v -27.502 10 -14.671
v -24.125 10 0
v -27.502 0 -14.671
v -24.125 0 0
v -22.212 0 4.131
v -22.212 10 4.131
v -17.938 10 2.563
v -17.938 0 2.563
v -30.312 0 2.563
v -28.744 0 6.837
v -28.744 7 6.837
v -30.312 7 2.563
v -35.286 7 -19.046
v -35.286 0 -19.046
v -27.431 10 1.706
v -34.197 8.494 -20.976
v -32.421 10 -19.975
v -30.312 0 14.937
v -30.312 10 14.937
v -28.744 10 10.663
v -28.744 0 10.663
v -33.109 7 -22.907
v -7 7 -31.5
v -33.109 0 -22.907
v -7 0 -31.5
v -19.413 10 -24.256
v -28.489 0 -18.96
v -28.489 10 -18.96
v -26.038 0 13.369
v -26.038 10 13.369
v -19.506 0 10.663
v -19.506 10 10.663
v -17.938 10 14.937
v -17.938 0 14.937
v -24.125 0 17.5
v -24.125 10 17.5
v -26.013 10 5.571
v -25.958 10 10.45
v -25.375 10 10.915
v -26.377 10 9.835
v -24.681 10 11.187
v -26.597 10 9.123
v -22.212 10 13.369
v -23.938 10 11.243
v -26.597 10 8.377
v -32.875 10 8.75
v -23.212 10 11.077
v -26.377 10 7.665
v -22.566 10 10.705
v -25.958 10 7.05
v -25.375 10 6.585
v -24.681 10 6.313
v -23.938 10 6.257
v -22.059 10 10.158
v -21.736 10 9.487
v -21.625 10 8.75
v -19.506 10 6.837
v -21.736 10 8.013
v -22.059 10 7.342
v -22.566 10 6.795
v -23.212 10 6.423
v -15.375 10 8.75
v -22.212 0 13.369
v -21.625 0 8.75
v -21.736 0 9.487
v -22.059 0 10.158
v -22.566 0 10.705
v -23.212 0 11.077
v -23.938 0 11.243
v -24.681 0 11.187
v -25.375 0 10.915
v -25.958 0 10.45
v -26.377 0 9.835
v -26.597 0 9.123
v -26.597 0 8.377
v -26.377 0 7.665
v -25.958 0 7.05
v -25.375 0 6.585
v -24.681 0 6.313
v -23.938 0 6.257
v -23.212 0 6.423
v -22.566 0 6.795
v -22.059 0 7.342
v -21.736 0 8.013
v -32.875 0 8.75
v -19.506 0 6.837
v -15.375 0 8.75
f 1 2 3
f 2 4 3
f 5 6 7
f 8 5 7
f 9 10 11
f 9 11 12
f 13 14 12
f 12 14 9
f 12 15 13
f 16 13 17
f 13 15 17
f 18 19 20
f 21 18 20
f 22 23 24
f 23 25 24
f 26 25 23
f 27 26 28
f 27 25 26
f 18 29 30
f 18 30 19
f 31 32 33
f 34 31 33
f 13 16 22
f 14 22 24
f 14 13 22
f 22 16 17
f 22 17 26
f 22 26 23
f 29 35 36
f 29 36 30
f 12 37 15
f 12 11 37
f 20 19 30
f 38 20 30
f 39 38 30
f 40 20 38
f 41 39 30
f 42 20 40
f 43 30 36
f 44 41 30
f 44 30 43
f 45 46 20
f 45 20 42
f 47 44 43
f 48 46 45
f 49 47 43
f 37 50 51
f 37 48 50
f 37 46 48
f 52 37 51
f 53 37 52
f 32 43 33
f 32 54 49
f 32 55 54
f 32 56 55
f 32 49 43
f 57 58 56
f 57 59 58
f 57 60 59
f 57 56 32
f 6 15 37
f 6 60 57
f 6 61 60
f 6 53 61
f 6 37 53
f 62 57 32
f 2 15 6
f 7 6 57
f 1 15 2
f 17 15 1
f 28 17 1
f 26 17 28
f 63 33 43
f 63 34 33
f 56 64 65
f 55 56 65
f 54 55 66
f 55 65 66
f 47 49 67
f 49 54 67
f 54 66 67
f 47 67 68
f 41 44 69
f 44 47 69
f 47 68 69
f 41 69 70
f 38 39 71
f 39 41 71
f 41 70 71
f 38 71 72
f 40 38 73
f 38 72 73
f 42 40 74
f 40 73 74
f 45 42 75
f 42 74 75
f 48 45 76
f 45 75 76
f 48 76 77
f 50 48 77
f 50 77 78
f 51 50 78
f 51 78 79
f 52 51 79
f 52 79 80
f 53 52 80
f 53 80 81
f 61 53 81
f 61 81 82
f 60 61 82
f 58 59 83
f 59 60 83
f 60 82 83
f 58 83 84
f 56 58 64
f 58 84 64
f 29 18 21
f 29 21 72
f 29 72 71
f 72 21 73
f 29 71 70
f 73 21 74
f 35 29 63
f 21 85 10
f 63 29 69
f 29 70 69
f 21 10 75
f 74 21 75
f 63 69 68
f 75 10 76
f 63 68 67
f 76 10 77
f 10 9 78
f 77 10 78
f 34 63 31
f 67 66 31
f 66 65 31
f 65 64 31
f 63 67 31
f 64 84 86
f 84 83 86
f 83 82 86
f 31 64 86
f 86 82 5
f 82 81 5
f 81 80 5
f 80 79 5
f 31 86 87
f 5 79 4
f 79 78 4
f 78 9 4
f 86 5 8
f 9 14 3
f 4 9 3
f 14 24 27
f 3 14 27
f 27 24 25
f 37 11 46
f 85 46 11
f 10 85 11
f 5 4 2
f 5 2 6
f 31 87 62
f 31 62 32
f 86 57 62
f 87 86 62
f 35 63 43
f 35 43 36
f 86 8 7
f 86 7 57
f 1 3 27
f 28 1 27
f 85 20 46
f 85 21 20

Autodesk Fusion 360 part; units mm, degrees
sketch "Sketch1" plane through (0, 0, 0) normal (0, 1, 0) x (1, 0, 0)
  line L0 (-7, 31.5) -> (-7, 0) construction
  line L1 (-35.9586, 21.9692) -> (-30.3122, -2.5628)
  line L2 (-7, 31.5) -> (-35.9586, 21.9692)
  line L3 (-22.2116, -4.1306) -> (-17.9378, -2.5628)
  line L4 (-27.5018, 14.6711) -> (-28.4889, 18.96)
  line L5 (-26.0384, -4.1306) -> (-24.125, 0)
  line L6 (-30.3122, -2.5628) -> (-24.125, 0)
  line L7 (-24.125, 0) -> (-17.9378, -2.5628)
  line L8 (-7, 31.5) -> (-14, -20.9929)
  line L9 (-7, 31.5) -> (-34.239, 31.5)
  circle A0 centre (-24.125, -8.75) radius 5
  line L10 (-24.125, 0) -> (-27.5018, 14.6711)
  circle A1 centre (-24.125, -8.75) radius 2.5
  line L11 (-30.3122, -14.9372) -> (-32.875, -8.75)
  line L12 (-28.7444, -10.6634) -> (-32.875, -8.75)
  line L13 (-17.9378, -2.5628) -> (-15.375, -8.75)
  line L14 (-24.125, -17.5) -> (-26.0384, -13.3694)
  line L15 (-43.7102, -20.9929) -> (-14, -20.9929)
  line L16 (-19.5056, -10.6634) -> (-17.9378, -14.9372)
  line L17 (-17.9378, -14.9372) -> (-24.125, -17.5)
  line L18 (-15.375, -8.75) -> (-17.9378, -14.9372)
  line L19 (-32.875, -8.75) -> (-28.7444, -6.8366)
  line L20 (-26.0384, -13.3694) -> (-30.3122, -14.9372)
  line L21 (-19.5056, -6.8366) -> (-15.375, -8.75)
  line L22 (-22.2116, -13.3694) -> (-24.125, -17.5)
  line L23 (-17.9378, -14.9372) -> (-22.2116, -13.3694)
  line L24 (-34.239, 31.5) -> (-43.7102, -20.9929)
  line L25 (-32.875, -8.75) -> (-30.3122, -2.5628)
  line L26 (-24.125, -17.5) -> (-30.3122, -14.9372)
  line L27 (-17.9378, -2.5628) -> (-19.5056, -6.8366)
  line L28 (-15.375, -8.75) -> (-19.5056, -10.6634)
  line L29 (-30.3122, -14.9372) -> (-28.7444, -10.6634)
  line L30 (-24.125, 0) -> (-22.2116, -4.1306)
  line L31 (-7, 31.5) -> (-28.4889, 18.96)
  line L32 (-29.1989, 4.3652) -> (-29.1875, 4.3554)
  line L33 (-30.3122, -2.5628) -> (-26.0384, -4.1306)
  line L34 (-21.0314, -1.2814) -> (-24.125, -8.75) construction
  line L35 (-28.7444, -6.8366) -> (-30.3122, -2.5628)
  point P0 (-24.125, -8.75)
  point P1 (-14, 0)
  point P2 (-14, 0)
  point P3 (-14, 0)
  point P4 (-7, 0)
extrude "Extrude1" add sketch "Sketch1" along normal blind 10 contours L1 L2 L4 L6 L10 L31 | L5 L6 L33 | A0 L33 L35 | L5 A0 L30 | A0 L12 L19 | A0 | L3 A0 L27 | A0 L20 L29 | A0 L21 L28 | A0 L14 L22 | A0 L16 L23
chamfer "Chamfer3" distance 3 angle 45 1 edges at (-35.9586, 5, -21.9692)
chamfer "Chamfer4" distance 3 angle 45 1 edges at (-20.0545, 10, -27.2035)
chamfer "Chamfer5" distance 3 angle 45 2 edges at (-32.7975, 10, -8.2352) (-29.5283, 10, 4.6997)
